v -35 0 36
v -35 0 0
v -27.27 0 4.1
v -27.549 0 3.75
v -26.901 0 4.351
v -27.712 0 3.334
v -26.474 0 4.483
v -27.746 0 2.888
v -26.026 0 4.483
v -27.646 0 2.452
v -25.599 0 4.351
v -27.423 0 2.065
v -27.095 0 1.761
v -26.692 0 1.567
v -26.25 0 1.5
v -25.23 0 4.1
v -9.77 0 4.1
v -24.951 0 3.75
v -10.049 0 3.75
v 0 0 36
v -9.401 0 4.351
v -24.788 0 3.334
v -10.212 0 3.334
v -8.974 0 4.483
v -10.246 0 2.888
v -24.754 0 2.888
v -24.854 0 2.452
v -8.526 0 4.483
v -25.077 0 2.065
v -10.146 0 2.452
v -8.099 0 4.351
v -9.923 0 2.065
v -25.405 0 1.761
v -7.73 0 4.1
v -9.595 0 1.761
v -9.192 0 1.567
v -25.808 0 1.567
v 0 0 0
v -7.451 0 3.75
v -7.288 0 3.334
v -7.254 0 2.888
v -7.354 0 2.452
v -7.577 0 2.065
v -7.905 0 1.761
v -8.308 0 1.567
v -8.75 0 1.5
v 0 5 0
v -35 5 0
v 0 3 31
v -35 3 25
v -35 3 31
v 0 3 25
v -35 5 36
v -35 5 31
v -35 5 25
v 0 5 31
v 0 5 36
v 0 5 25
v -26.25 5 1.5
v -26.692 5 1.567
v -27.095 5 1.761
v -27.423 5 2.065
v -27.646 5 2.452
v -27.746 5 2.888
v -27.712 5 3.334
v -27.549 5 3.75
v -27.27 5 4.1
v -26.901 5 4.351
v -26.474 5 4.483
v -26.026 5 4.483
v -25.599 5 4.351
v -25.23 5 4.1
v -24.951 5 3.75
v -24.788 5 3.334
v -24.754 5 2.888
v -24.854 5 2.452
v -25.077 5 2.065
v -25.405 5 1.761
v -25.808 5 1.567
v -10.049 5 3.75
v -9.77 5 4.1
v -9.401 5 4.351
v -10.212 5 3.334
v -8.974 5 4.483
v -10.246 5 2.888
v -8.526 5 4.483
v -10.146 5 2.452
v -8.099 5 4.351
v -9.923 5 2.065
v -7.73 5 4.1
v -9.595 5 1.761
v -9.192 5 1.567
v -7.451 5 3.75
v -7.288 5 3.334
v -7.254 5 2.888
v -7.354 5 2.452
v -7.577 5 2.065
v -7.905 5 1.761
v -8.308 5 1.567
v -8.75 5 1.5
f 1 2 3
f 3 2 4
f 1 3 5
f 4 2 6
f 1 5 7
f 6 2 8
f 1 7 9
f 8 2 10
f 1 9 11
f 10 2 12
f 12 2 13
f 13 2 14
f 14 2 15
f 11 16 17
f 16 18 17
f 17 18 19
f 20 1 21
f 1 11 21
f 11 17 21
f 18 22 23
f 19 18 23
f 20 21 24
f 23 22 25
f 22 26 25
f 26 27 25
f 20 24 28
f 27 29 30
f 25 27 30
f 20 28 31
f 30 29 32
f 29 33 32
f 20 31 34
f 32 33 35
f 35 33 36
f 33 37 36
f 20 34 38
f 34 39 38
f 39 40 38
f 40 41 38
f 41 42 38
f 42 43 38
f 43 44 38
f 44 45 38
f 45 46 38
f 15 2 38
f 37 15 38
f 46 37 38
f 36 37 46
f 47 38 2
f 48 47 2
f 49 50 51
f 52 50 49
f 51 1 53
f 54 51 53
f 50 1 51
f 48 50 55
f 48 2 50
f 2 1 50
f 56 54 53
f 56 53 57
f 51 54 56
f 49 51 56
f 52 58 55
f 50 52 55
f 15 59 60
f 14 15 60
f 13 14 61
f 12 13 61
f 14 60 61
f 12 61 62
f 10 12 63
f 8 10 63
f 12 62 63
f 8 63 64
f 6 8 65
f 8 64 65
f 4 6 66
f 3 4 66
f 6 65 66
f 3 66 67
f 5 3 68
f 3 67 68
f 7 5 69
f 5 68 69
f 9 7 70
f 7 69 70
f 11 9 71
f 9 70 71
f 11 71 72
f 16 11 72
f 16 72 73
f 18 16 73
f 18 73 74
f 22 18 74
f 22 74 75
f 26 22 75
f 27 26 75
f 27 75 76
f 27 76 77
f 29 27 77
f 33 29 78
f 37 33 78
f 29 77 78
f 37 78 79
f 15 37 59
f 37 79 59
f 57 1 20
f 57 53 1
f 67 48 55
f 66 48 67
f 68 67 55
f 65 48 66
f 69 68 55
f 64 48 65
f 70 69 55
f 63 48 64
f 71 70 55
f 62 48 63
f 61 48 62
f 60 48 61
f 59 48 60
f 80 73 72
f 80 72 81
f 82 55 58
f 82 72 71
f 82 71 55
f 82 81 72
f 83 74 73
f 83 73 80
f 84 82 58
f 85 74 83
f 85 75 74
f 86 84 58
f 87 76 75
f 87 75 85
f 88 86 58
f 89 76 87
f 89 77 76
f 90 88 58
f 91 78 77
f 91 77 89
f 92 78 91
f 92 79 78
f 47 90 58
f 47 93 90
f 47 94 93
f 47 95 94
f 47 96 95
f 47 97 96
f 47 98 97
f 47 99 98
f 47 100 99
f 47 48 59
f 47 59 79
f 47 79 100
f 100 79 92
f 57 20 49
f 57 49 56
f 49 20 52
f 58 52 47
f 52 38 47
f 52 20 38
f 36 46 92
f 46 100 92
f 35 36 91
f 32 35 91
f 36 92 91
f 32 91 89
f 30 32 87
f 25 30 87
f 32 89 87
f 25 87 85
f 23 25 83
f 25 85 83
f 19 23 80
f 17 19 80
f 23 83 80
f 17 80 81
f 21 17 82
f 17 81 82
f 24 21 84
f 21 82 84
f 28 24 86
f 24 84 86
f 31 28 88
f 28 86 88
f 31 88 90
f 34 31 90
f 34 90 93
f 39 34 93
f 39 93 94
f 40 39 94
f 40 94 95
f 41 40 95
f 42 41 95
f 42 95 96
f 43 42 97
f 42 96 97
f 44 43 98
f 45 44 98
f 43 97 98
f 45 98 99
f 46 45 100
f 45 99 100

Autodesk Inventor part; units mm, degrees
ref_plane "YZ Plane" through (0, 0, 0) normal (1, 0, 0) x (0, 1, 0)
ref_plane "XZ Plane" through (0, 0, 0) normal (0, 1, 0) x (-1, 0, 0)
ref_plane "XY Plane" through (0, 0, 0) normal (0, 0, 1) x (1, 0, 0)
sketch "Sketch1" plane through (0, 0, 0) normal (0, 1, 0) x (-1, 0, 0)
  line L0 (0, 0) -> (35, 0)
  line L1 (35, 0) -> (35, 6)
  line L2 (0, 6) -> (35, 6)
  line L3 (0, 0) -> (0, 6)
  line L4 (0, 6) -> (0, 0)
  line L5 (0, 3) -> (35, 3)
  line L6 (17.5, 3) -> (35, 3)
  line L7 (17.5, 3) -> (0, 3)
  point P0 (17.5, 0)
  point P1 (8.75, 3)
  point P2 (26.25, 3)
extrude "Extrusion1" add sketch "Sketch1" along normal blind 5
sketch "Sketch2" plane through (-35, 0, 6) normal (0, 0, 1) x (1, 0, 0)
  line L0 (0, 0) -> (35, 0) projected
  line L1 (35, 0) -> (35, 5) projected
  line L2 (0, 5) -> (35, 5) projected
  line L3 (0, 0) -> (0, 5) projected
extrude "Extrusion2" add sketch "Sketch2" along normal blind 30
sketch "Sketch3" plane through (0, 5, 0) normal (0, 1, 0) x (1, 0, 0)
  line L0 (0, 0) -> (0, -36) projected
  line L1 (0, 0) -> (-35, 0) projected
  line L2 (-35, 0) -> (-35, -36) projected
  line L3 (0, -36) -> (-35, -36) projected
  line L4 (-35, 0) -> (-35, -36) projected
  line L5 (-35, -31) -> (0, -31)
  line L6 (0, -31) -> (0, -25)
  line L7 (0, -25) -> (-35, -25)
  line L8 (-35, -25) -> (-35, -31)
  dimension "d4" = 5
  dimension "d5" = 25
extrude "Extrusion3" cut sketch "Sketch3" against normal blind 2 contours L0 L5 L2 L7
sketch "Sketch4" plane through (0, 0, 0) normal (0, -1, 0) x (1, 0, 0)
  line L0 (-35, 0) -> (0, 0)
  line L1 (0, 0) -> (0, 6)
  line L2 (-35, 6) -> (0, 6)
  line L3 (-35, 0) -> (-35, 6)
  line L4 (-35, 6) -> (-35, 0)
  line L5 (-35, 3) -> (0, 3)
  line L6 (-17.5, 3) -> (0, 3)
  line L7 (-17.5, 3) -> (-35, 3)
  point P0 (0, 0)
  point P1 (-17.5, 0)
  point P2 (-8.75, 3)
  point P3 (-26.25, 3)
hole "Hole1" at (-8.75, 0, 3) at (-26.25, 0, 3) direction (0, 1, 0) diameter 3 depth 8 tip angle 118
properties part number "angle_clip" material "ABS Plastic"
